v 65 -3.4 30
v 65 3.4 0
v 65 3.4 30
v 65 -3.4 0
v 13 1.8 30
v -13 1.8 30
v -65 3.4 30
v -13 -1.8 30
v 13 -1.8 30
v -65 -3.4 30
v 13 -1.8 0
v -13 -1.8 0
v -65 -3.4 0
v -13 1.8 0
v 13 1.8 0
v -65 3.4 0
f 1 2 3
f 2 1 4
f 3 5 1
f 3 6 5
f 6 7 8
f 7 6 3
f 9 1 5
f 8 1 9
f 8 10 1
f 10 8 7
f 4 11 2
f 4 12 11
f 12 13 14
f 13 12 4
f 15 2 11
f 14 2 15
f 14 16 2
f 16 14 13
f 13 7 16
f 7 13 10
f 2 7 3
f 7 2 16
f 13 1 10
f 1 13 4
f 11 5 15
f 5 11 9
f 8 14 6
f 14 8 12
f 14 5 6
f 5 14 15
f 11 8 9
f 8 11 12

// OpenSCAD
slot_w = 26;
slot_h = 3.6;

height = 30;
wing_l = slot_w * 2;
filament_w = 0.4;
wall_t = filament_w * 4;
width = slot_h + wall_t * 2;
length = wing_l * 2 + slot_w;

translate([-length/2, -width/2, 0])
difference() {
    cube(size=[length, width, height]);
    translate([wing_l, wall_t, -1])
    cube(size=[slot_w, slot_h, height + 2]);
}
